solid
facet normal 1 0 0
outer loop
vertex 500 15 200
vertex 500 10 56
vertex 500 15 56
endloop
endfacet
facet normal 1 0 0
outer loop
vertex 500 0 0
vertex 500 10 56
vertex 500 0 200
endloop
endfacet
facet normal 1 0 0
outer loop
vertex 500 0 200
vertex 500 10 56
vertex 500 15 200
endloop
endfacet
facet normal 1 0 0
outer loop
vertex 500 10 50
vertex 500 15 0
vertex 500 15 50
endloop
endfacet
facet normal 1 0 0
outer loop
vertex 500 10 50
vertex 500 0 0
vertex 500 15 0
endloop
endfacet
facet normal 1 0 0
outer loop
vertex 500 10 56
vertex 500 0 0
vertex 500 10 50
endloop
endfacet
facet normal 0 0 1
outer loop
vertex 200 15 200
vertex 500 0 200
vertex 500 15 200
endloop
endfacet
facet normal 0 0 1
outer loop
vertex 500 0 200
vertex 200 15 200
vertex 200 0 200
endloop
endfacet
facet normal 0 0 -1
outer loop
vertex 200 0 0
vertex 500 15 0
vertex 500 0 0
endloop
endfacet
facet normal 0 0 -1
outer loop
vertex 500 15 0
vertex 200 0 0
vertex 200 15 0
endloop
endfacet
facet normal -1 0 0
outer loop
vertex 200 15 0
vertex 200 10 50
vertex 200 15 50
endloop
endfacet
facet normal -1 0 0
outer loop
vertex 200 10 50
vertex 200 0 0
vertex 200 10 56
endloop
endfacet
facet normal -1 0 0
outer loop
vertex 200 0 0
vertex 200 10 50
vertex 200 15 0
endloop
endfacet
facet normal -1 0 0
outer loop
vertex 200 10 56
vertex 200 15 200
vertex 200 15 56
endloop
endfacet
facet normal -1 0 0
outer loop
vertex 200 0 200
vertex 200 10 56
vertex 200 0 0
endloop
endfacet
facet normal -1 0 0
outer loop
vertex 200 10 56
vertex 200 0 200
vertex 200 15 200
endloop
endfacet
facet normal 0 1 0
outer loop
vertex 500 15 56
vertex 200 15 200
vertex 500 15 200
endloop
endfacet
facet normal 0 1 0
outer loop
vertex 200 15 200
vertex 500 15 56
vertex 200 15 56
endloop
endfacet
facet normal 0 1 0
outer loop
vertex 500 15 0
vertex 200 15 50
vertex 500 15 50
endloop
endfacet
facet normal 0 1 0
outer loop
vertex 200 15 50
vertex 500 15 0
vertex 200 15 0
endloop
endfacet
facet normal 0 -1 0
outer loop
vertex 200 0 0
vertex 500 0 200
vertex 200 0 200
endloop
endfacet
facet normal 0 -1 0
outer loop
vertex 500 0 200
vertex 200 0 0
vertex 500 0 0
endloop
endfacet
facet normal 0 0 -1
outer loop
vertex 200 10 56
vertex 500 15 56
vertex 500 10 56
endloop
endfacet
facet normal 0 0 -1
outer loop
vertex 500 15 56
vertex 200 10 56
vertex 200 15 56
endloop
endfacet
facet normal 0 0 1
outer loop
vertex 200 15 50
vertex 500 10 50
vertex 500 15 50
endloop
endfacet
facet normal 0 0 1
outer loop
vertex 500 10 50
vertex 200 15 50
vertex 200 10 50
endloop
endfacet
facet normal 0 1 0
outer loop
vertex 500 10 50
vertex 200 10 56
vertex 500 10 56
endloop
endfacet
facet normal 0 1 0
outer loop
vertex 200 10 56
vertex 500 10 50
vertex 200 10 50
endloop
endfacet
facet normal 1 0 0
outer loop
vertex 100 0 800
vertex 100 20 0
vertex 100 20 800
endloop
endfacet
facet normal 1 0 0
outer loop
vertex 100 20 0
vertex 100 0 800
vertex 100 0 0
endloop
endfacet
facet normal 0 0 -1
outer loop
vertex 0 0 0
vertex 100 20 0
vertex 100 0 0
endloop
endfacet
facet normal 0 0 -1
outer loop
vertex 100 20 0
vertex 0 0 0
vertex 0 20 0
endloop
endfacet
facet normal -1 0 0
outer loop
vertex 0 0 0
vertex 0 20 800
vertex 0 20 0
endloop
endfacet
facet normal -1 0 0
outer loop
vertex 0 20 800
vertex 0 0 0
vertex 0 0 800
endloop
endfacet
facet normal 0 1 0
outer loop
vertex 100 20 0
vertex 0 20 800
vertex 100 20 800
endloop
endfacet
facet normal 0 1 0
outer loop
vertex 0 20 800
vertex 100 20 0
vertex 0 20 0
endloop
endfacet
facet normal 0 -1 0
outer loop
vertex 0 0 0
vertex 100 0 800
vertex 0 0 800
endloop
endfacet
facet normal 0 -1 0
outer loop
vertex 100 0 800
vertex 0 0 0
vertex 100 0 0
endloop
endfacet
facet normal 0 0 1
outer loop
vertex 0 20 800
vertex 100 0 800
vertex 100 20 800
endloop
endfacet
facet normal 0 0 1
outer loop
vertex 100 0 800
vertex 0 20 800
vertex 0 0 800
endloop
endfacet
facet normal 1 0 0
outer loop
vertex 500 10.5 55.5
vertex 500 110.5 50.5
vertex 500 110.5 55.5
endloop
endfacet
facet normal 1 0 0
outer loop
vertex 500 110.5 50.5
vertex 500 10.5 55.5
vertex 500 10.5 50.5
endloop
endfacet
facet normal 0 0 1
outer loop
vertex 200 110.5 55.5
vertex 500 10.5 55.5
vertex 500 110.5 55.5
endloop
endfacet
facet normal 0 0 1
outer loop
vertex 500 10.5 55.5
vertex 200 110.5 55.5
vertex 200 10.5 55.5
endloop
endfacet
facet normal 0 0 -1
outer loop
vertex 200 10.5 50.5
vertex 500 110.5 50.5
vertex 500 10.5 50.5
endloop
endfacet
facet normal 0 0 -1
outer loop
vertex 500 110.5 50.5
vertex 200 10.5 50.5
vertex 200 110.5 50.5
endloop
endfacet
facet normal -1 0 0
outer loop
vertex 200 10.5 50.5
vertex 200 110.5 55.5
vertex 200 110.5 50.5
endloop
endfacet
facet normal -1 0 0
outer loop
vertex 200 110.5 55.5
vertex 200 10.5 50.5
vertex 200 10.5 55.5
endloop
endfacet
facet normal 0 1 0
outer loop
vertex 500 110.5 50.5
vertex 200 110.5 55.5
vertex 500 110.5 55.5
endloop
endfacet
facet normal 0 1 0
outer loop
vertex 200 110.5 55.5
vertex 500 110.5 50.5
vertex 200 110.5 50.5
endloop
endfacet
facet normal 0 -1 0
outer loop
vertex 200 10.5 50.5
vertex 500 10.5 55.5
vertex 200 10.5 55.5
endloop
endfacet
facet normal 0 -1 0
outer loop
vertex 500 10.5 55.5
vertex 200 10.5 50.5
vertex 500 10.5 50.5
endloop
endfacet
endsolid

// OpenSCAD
// Two boards flush in one plane, and a panel passing through a groove.
//
// The union welds the side faces of the two boards into one 800 mm polygon, and a triangle of
// that polygon can span both boards. Each board's face must still claim its own part of it and
// report its own height. The panel's end lies in the plane of the wall's end, inside the groove:
// that region is not the wall's material, so the wall's end face must not claim it.

// @group Flush
    // @name Lower board
    cube([100, 20, 300]);
    // @name Upper board
    translate([0, 0, 300]) cube([100, 20, 500]);
// @endgroup

// @group Groove
    // @name Wall
    translate([200, 0, 0]) difference() {
        cube([300, 15, 200]);
        translate([-1, 10, 50]) cube([302, 6, 6]);   // groove along the wall, open at both ends
    }
    // @name Panel
    color("tan") translate([200, 10.5, 50.5]) cube([300, 100, 5]);
// @endgroup
